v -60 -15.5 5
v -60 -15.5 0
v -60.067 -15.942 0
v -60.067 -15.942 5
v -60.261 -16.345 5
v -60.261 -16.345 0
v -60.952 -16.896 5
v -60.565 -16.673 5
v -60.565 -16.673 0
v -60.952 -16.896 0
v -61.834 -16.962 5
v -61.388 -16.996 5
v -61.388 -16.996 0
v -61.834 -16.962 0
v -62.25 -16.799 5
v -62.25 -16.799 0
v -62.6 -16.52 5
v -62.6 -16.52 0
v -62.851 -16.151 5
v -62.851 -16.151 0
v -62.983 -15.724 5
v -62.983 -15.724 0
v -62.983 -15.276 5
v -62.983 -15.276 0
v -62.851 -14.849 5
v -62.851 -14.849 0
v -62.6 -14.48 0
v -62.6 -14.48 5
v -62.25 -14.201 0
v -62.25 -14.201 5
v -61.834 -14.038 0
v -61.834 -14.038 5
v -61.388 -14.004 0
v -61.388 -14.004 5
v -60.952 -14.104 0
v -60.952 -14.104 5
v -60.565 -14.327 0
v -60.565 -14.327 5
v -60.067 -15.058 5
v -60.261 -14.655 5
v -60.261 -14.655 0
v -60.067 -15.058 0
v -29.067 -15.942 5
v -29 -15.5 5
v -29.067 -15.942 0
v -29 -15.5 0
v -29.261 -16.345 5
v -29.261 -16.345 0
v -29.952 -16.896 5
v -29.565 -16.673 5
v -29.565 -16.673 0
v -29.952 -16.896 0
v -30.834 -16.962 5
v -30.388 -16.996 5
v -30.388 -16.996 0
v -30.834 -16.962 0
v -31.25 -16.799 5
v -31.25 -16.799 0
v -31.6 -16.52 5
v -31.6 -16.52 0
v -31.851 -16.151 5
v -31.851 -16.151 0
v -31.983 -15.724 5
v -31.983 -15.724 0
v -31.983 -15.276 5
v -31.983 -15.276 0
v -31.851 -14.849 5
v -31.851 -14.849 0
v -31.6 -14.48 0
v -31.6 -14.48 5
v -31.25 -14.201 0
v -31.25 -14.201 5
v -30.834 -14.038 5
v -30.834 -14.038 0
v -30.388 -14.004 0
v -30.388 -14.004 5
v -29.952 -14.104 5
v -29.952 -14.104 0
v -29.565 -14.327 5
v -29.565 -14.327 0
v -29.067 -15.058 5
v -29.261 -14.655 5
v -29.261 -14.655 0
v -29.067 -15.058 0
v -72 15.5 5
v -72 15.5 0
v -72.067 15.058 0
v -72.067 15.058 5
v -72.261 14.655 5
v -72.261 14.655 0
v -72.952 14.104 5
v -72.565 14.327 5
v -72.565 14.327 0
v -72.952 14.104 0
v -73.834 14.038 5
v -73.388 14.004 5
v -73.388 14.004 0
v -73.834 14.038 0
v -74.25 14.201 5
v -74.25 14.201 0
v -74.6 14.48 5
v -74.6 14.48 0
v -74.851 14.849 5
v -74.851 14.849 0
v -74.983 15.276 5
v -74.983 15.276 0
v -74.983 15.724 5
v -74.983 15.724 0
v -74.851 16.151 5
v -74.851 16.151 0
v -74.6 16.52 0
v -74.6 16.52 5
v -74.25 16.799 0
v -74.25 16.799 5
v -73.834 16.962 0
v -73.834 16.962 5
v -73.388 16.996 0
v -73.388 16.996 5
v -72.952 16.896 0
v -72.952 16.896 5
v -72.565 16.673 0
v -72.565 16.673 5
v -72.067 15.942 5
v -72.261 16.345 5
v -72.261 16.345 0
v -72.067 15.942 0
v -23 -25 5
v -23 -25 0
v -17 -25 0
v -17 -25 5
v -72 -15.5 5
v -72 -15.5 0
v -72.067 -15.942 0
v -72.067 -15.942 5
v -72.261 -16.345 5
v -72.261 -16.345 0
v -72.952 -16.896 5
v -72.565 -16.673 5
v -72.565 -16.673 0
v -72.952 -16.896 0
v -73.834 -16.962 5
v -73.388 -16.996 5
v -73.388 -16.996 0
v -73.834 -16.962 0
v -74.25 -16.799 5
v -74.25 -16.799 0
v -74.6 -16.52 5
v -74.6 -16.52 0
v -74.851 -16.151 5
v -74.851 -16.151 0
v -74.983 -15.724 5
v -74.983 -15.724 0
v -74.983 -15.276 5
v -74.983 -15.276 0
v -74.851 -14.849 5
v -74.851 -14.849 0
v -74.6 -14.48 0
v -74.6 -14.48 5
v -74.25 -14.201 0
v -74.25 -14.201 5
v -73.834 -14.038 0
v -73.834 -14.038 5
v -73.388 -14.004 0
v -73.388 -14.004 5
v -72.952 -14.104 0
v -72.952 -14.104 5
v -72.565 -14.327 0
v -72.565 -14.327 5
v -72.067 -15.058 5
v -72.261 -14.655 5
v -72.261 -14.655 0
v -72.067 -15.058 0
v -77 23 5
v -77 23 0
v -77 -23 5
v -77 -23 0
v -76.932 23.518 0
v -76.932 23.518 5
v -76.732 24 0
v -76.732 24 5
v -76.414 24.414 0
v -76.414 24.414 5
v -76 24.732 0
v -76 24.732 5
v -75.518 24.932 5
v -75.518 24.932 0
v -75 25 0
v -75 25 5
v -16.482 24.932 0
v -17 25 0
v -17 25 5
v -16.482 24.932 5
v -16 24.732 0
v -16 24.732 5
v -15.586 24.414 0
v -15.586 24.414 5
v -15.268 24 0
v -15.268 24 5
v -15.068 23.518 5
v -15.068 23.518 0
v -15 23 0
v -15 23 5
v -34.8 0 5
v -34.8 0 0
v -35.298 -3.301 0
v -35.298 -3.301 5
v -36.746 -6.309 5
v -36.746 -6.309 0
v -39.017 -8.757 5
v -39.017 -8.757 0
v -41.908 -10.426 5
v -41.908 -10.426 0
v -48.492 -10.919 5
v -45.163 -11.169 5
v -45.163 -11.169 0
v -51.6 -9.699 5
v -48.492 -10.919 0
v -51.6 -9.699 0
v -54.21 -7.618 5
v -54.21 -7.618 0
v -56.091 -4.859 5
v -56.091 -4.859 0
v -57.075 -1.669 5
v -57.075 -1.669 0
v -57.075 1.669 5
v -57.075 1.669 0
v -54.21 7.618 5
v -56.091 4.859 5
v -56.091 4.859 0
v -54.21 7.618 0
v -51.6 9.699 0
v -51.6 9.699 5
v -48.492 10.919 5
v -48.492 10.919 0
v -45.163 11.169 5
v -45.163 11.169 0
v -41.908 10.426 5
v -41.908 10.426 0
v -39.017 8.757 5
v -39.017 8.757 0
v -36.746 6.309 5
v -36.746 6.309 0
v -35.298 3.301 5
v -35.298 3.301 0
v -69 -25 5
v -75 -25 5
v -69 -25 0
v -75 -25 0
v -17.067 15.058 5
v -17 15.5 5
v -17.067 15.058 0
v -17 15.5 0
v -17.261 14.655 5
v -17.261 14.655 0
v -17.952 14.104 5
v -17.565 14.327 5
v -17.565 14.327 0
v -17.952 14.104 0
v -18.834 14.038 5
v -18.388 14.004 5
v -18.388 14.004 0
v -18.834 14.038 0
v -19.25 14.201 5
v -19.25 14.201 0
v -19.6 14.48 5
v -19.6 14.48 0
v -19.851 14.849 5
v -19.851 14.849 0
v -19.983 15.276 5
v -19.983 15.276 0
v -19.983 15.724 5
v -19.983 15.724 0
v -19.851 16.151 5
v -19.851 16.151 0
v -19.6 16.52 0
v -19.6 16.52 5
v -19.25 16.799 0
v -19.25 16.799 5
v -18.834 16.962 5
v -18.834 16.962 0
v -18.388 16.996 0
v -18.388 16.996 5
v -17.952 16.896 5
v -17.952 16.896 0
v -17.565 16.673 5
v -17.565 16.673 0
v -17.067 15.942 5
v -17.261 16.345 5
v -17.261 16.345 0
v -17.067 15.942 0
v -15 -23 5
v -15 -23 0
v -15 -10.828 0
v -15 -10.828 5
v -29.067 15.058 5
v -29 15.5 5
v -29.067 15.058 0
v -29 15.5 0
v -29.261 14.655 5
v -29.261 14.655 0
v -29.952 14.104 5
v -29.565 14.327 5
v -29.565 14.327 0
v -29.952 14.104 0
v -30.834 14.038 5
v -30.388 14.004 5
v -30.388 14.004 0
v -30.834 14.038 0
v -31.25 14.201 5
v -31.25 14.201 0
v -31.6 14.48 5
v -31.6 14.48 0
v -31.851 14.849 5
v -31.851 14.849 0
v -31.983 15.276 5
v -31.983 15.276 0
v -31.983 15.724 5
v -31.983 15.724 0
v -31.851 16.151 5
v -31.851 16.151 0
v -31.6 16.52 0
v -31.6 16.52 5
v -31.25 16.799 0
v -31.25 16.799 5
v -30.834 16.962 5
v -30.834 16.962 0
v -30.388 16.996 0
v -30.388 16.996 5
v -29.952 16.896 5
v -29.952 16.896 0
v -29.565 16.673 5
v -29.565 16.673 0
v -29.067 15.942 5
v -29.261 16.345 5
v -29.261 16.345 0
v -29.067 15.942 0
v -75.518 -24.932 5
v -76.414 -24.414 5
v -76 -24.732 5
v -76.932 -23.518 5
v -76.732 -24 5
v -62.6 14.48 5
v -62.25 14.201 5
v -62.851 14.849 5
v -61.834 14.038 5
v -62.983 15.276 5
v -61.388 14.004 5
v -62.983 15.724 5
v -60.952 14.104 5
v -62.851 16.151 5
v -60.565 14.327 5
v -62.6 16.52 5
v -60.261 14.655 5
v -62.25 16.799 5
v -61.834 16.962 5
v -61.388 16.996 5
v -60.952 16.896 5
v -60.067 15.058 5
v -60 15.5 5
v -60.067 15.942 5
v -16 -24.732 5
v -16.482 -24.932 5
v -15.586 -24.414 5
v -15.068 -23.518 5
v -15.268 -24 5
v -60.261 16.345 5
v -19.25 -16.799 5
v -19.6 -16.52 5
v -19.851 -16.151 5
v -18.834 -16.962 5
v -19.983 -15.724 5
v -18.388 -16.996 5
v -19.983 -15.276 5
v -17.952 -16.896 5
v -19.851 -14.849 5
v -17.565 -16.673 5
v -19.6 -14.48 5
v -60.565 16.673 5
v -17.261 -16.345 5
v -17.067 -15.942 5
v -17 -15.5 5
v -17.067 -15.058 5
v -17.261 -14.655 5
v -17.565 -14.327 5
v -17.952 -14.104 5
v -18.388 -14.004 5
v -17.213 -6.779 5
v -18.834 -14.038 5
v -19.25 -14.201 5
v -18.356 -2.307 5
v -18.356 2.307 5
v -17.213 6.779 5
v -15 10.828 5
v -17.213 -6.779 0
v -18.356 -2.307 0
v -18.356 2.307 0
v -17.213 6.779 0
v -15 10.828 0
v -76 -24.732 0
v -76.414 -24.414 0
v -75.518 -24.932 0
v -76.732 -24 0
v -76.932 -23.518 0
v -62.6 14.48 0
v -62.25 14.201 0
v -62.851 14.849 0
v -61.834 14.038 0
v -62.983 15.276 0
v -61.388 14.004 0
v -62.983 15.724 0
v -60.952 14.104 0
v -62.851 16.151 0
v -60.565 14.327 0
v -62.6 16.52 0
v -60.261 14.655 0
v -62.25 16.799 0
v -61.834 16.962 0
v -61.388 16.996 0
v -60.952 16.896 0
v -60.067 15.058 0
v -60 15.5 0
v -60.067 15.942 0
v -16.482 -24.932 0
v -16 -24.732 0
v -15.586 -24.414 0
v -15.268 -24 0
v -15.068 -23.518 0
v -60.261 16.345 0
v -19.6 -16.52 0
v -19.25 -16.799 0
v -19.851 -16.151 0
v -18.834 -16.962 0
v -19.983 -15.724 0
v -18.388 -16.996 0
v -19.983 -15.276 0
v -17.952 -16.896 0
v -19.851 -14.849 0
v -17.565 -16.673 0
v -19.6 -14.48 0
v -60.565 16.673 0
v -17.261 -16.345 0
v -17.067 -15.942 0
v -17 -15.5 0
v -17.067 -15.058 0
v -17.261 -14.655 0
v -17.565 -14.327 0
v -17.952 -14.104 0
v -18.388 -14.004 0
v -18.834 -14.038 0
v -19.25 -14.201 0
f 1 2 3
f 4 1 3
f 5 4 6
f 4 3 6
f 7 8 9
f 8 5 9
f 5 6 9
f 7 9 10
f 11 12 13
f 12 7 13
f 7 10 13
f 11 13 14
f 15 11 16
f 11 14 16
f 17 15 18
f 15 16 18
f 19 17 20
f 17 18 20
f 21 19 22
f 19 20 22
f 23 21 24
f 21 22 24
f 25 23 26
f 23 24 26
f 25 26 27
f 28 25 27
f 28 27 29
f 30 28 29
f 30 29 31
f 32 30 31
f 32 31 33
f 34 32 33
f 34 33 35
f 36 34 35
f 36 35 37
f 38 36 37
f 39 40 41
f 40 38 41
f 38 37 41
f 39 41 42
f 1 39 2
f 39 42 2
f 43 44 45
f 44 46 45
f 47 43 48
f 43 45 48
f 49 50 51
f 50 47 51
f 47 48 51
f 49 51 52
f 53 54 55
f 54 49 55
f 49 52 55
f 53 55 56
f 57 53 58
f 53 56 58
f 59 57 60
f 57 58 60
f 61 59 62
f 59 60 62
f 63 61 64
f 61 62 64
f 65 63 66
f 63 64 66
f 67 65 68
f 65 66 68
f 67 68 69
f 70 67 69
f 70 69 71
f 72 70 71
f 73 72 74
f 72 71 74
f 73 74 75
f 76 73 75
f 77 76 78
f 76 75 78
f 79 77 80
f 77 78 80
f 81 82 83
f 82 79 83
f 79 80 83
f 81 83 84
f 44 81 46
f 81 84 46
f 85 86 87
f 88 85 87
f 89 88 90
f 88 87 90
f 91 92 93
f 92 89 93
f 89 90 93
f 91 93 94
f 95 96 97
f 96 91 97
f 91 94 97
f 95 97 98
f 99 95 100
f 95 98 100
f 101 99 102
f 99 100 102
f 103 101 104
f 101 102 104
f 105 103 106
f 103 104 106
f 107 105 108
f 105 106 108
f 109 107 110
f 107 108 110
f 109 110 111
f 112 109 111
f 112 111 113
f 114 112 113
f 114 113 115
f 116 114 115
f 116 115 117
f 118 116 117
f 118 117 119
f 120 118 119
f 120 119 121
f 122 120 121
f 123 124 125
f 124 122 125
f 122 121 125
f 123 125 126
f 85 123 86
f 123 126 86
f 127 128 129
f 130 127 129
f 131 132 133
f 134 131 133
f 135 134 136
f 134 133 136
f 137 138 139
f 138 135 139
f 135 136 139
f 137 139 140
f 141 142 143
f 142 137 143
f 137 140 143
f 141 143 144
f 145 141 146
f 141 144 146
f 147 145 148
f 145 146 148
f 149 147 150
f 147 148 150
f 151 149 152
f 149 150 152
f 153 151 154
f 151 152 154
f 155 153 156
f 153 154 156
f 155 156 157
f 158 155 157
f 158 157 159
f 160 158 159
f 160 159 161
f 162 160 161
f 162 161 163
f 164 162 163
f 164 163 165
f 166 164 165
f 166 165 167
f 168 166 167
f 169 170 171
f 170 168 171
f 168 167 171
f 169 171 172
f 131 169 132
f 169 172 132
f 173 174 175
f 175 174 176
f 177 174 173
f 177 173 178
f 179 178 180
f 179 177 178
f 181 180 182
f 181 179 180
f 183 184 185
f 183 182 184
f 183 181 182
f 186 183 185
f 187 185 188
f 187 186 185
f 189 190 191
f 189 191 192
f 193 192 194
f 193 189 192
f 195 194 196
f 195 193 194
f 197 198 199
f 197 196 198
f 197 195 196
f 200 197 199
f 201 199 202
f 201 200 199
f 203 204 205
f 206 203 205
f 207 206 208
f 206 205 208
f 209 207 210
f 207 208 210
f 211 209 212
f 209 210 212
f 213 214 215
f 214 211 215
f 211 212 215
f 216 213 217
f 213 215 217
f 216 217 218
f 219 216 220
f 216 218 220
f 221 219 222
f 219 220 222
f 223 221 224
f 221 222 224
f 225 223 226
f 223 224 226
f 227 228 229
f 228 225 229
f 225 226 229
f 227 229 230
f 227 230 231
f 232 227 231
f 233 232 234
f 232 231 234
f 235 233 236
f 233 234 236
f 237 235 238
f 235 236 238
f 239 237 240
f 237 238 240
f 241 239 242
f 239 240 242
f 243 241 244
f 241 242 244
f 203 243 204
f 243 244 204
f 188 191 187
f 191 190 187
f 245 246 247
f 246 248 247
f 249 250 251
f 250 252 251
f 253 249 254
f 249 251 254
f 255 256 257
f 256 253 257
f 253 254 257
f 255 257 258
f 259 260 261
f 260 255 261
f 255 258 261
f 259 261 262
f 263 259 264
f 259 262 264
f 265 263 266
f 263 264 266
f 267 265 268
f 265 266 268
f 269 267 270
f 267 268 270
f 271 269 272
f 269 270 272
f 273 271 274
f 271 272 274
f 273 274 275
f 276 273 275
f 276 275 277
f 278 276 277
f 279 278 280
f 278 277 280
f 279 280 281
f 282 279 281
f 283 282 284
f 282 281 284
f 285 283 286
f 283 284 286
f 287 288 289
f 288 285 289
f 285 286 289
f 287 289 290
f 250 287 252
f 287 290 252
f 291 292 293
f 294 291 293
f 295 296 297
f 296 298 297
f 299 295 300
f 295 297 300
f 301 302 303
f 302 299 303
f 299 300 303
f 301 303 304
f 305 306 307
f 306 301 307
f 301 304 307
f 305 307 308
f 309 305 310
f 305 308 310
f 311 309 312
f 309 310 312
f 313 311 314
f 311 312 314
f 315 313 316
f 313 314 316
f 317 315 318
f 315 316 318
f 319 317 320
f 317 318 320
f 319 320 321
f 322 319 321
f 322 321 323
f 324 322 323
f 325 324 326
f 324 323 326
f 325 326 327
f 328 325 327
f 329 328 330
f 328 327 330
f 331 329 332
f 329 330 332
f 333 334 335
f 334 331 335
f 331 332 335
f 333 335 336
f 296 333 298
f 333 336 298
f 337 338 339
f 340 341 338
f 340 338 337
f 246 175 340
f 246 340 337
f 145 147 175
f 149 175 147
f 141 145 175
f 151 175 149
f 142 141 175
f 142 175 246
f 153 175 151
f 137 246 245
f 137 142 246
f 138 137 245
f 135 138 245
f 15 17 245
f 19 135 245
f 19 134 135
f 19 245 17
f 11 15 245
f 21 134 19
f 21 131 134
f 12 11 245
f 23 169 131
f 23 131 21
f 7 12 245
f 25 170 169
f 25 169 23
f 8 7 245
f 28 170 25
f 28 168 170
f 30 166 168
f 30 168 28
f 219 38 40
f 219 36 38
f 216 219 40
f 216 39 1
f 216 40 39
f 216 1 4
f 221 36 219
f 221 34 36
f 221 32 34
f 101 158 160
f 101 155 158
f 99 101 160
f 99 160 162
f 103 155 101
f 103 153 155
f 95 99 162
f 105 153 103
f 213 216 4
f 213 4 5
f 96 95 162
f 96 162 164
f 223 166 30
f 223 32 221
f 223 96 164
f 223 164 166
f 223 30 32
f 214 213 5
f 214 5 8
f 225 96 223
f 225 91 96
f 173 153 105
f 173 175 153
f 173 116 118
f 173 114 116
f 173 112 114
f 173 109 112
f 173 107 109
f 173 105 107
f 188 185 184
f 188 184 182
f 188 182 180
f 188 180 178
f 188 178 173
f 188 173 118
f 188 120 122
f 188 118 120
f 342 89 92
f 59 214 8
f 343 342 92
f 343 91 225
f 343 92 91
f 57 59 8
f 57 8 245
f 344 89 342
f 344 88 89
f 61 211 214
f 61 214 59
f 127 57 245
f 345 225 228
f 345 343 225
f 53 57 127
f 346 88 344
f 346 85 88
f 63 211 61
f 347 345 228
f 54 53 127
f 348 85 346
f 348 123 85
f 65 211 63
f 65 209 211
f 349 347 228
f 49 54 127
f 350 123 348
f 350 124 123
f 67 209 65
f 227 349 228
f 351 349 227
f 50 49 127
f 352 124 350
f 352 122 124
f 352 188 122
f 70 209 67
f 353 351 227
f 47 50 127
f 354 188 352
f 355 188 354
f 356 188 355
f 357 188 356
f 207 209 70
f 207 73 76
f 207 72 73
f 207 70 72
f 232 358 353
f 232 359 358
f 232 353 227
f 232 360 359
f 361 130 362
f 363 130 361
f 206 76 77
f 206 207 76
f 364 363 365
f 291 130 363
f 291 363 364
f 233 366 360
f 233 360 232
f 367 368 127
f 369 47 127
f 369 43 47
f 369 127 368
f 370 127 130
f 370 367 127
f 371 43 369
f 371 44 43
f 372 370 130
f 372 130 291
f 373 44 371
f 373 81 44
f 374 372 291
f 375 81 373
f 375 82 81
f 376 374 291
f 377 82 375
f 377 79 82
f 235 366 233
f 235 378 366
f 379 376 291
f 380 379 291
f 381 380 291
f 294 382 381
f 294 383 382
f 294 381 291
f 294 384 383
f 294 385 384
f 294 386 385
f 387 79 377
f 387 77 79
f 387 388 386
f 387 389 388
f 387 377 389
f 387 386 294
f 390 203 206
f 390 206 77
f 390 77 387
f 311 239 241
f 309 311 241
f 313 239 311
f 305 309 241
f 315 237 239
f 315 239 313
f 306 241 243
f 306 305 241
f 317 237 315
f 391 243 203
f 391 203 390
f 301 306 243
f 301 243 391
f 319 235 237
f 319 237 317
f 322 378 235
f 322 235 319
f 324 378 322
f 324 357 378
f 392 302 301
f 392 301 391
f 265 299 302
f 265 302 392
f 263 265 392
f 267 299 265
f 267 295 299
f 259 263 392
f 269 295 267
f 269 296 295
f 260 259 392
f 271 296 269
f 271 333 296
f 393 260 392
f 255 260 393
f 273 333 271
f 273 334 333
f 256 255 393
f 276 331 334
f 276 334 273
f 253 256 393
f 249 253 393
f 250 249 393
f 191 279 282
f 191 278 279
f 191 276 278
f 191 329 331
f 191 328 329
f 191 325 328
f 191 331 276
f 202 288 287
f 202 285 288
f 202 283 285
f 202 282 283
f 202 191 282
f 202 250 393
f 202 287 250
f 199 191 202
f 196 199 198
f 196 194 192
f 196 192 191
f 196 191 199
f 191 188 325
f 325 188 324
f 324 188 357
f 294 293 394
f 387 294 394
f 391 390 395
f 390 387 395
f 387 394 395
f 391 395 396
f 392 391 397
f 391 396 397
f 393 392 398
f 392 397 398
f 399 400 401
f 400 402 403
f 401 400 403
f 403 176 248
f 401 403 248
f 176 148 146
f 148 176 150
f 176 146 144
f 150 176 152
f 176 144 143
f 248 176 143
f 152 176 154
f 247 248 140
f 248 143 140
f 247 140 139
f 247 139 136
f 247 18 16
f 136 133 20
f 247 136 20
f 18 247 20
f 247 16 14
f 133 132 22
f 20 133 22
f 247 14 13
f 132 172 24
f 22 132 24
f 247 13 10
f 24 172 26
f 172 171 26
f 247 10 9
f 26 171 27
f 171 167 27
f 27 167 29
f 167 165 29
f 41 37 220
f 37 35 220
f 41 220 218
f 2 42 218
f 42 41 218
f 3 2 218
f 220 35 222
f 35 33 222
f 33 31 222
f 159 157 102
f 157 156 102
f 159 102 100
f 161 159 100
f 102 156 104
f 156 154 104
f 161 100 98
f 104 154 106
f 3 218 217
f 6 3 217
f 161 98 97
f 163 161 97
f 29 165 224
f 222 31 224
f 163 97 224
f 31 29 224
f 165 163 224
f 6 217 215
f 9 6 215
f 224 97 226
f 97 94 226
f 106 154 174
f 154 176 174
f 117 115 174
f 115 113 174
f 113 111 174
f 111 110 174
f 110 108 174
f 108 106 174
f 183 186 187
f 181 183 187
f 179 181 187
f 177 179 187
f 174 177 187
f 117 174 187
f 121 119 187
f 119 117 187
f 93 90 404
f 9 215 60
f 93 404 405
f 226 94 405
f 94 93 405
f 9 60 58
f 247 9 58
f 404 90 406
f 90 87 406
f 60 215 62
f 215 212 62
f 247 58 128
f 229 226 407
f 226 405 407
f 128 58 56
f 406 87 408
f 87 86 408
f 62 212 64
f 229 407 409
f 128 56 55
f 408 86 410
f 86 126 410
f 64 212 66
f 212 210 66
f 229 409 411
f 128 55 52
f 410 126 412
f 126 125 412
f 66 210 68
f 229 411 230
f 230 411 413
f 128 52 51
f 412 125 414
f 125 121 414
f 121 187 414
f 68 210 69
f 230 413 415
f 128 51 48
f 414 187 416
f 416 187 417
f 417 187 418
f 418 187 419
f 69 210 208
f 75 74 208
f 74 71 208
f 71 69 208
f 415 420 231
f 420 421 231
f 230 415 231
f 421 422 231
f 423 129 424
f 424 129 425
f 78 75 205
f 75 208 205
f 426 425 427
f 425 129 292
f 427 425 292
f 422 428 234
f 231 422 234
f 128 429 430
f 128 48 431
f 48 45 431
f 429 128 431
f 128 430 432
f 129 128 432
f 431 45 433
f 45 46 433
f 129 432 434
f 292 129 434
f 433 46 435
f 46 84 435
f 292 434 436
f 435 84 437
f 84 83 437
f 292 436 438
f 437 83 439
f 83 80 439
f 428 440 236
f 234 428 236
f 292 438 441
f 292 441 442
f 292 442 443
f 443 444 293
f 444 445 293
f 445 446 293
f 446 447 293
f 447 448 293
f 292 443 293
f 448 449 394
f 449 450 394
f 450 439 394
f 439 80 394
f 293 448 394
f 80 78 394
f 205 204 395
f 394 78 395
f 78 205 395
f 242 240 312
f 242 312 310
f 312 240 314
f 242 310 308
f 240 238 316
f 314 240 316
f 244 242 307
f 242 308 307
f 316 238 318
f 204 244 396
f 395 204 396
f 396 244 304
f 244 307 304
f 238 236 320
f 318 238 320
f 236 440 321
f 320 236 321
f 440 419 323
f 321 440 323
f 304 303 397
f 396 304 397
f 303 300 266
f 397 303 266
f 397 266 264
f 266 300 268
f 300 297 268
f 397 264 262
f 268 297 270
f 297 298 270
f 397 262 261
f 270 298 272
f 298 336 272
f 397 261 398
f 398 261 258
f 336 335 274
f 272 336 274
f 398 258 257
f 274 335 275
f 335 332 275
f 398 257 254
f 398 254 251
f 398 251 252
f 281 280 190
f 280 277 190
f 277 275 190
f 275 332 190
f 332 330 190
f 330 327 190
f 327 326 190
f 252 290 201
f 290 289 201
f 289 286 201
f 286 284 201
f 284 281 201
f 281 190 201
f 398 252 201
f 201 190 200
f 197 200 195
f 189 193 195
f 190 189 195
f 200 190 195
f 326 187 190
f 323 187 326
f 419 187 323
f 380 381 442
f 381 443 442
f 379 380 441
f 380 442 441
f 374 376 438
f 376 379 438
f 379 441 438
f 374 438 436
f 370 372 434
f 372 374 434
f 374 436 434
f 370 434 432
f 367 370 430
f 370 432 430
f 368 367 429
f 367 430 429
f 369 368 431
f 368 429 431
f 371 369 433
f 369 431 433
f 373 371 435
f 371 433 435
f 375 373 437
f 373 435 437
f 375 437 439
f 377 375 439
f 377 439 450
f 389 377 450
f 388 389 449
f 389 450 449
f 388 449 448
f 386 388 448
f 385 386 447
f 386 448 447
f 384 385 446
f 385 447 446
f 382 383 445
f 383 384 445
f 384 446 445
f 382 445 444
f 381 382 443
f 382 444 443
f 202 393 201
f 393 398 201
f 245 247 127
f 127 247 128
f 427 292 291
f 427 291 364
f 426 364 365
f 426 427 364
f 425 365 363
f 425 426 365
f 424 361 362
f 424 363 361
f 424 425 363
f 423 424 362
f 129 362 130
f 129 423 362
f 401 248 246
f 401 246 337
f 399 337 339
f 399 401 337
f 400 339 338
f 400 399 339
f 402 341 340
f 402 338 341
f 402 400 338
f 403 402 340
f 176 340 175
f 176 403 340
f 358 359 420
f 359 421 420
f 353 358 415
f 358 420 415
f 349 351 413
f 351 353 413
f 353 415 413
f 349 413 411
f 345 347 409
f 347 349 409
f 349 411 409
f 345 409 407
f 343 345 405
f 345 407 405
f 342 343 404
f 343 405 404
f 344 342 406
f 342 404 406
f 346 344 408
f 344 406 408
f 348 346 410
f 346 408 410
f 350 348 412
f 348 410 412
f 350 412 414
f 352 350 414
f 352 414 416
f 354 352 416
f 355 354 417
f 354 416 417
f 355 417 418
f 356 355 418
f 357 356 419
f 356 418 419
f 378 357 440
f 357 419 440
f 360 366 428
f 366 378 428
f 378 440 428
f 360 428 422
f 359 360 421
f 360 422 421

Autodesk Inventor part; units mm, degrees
ref_plane "YZ Plane" through (0, 0, 0) normal (1, 0, 0) x (0, 1, 0)
ref_plane "XZ Plane" through (0, 0, 0) normal (0, 1, 0) x (-1, 0, 0)
ref_plane "XY Plane" through (0, 0, 0) normal (0, 0, 1) x (1, 0, 0)
sketch "Sketch1" plane through (0, 0, 0) normal (0, 0, 1) x (1, 0, 0)
  arc A0 (-15, 10.8282) -> (-15, -10.8282) centre (0, 0) ccw projected
  line L0 (-15, -23) -> (-15, -10.8282) projected
  line L1 (-15, 10.8282) -> (-15, 23) projected
  line L2 (-17, 25) -> (-75, 25) projected
  arc A1 (-15, 23) -> (-17, 25) centre (-17, 23) ccw projected
  arc A2 (-75, 25) -> (-77, 23) centre (-75, 23) ccw projected
  line L3 (-77, 23) -> (-77, -23) projected
  arc A3 (-77, -23) -> (-75, -25) centre (-75, -23) ccw projected
  line L4 (-75, -25) -> (-17, -25) projected
  arc A4 (-17, -25) -> (-15, -23) centre (-17, -23) ccw projected
  circle A5 centre (-18.5, -15.5) radius 1.5 projected
  circle A6 centre (-18.5, 15.5) radius 1.5 projected
  circle A7 centre (-73.5, 15.5) radius 1.5 projected
  circle A8 centre (-73.5, -15.5) radius 1.5 projected
  circle A9 centre (-60.15, -16.85) radius 1.5 construction
  circle A10 centre (-29.15, -16.85) radius 1.5 construction
  circle A11 centre (-29.15, 14.15) radius 1.5 construction
  circle A12 centre (-60.15, 14.15) radius 1.5 construction
  circle A13 centre (-29.15, 14.15) radius 1.5 construction
  circle A14 centre (-44.65, -1.35) radius 11.2 construction
  circle A15 centre (-44.65, -1.35) radius 11.2 construction
  circle A16 centre (-18.5, -15.5) radius 1.5
  circle A17 centre (-18.5, 15.5) radius 1.5
  circle A18 centre (-73.5, 15.5) radius 1.5
  circle A19 centre (-73.5, -15.5) radius 1.5
  line L5 (-17, -25) -> (-75, -25)
  line L6 (-77, -23) -> (-77, 23)
  line L7 (-75, 25) -> (-17, 25)
  arc A20 (-15, 23) -> (-17, 25) centre (-17, 23) ccw
  arc A21 (-17, -25) -> (-15, -23) centre (-17, -23) ccw
  arc A22 (-77, -23) -> (-75, -25) centre (-75, -23) ccw
  arc A23 (-75, 25) -> (-77, 23) centre (-75, 23) ccw
  line L8 (-15, 23) -> (-15, 10.8282)
  line L9 (-15, -10.8282) -> (-15, -23)
  arc A24 (-15, 10.8282) -> (-15, -10.8282) centre (0, 0) ccw
  line L10 (-23, -25) -> (-69, -25) projected
  line L11 (-23, -25) -> (-69, -25) projected
  line L12 (-46, -23) -> (-46, 0) construction
  circle A25 centre (-46, 0) radius 11.2
  line L13 (-46, 0) -> (-46, 15.5) construction
  line L14 (-46, 15.5) -> (-30.5, 15.5) construction
  line L15 (-46, 15.5) -> (-61.5, 15.5) construction
  circle A26 centre (-30.5, 15.5) radius 1.5
  circle A27 centre (-61.5, 15.5) radius 1.5
  line L16 (-46, 0) -> (-46, -15.5) construction
  line L17 (-46, -15.5) -> (-61.5, -15.5) construction
  line L18 (-46, -15.5) -> (-30.5, -15.5) construction
  circle A28 centre (-30.5, -15.5) radius 1.5
  circle A29 centre (-61.5, -15.5) radius 1.5
  point P0 (0, 0)
  dimension "d0" = 2
  dimension "d1" = 22.4
  dimension "d2" = 15.5
  dimension "d3" = 15.5
  dimension "d4" = 15.5
  dimension "d5" = 3
  dimension "d6" = 3
  dimension "d7" = 15.5
  dimension "d8" = 15.5
  dimension "d9" = 15.5
  dimension "d10" = 3
  dimension "d11" = 3
extrude "Extrusion1" add sketch "Sketch1" along normal blind 5
properties part number "motor_cover_final"
